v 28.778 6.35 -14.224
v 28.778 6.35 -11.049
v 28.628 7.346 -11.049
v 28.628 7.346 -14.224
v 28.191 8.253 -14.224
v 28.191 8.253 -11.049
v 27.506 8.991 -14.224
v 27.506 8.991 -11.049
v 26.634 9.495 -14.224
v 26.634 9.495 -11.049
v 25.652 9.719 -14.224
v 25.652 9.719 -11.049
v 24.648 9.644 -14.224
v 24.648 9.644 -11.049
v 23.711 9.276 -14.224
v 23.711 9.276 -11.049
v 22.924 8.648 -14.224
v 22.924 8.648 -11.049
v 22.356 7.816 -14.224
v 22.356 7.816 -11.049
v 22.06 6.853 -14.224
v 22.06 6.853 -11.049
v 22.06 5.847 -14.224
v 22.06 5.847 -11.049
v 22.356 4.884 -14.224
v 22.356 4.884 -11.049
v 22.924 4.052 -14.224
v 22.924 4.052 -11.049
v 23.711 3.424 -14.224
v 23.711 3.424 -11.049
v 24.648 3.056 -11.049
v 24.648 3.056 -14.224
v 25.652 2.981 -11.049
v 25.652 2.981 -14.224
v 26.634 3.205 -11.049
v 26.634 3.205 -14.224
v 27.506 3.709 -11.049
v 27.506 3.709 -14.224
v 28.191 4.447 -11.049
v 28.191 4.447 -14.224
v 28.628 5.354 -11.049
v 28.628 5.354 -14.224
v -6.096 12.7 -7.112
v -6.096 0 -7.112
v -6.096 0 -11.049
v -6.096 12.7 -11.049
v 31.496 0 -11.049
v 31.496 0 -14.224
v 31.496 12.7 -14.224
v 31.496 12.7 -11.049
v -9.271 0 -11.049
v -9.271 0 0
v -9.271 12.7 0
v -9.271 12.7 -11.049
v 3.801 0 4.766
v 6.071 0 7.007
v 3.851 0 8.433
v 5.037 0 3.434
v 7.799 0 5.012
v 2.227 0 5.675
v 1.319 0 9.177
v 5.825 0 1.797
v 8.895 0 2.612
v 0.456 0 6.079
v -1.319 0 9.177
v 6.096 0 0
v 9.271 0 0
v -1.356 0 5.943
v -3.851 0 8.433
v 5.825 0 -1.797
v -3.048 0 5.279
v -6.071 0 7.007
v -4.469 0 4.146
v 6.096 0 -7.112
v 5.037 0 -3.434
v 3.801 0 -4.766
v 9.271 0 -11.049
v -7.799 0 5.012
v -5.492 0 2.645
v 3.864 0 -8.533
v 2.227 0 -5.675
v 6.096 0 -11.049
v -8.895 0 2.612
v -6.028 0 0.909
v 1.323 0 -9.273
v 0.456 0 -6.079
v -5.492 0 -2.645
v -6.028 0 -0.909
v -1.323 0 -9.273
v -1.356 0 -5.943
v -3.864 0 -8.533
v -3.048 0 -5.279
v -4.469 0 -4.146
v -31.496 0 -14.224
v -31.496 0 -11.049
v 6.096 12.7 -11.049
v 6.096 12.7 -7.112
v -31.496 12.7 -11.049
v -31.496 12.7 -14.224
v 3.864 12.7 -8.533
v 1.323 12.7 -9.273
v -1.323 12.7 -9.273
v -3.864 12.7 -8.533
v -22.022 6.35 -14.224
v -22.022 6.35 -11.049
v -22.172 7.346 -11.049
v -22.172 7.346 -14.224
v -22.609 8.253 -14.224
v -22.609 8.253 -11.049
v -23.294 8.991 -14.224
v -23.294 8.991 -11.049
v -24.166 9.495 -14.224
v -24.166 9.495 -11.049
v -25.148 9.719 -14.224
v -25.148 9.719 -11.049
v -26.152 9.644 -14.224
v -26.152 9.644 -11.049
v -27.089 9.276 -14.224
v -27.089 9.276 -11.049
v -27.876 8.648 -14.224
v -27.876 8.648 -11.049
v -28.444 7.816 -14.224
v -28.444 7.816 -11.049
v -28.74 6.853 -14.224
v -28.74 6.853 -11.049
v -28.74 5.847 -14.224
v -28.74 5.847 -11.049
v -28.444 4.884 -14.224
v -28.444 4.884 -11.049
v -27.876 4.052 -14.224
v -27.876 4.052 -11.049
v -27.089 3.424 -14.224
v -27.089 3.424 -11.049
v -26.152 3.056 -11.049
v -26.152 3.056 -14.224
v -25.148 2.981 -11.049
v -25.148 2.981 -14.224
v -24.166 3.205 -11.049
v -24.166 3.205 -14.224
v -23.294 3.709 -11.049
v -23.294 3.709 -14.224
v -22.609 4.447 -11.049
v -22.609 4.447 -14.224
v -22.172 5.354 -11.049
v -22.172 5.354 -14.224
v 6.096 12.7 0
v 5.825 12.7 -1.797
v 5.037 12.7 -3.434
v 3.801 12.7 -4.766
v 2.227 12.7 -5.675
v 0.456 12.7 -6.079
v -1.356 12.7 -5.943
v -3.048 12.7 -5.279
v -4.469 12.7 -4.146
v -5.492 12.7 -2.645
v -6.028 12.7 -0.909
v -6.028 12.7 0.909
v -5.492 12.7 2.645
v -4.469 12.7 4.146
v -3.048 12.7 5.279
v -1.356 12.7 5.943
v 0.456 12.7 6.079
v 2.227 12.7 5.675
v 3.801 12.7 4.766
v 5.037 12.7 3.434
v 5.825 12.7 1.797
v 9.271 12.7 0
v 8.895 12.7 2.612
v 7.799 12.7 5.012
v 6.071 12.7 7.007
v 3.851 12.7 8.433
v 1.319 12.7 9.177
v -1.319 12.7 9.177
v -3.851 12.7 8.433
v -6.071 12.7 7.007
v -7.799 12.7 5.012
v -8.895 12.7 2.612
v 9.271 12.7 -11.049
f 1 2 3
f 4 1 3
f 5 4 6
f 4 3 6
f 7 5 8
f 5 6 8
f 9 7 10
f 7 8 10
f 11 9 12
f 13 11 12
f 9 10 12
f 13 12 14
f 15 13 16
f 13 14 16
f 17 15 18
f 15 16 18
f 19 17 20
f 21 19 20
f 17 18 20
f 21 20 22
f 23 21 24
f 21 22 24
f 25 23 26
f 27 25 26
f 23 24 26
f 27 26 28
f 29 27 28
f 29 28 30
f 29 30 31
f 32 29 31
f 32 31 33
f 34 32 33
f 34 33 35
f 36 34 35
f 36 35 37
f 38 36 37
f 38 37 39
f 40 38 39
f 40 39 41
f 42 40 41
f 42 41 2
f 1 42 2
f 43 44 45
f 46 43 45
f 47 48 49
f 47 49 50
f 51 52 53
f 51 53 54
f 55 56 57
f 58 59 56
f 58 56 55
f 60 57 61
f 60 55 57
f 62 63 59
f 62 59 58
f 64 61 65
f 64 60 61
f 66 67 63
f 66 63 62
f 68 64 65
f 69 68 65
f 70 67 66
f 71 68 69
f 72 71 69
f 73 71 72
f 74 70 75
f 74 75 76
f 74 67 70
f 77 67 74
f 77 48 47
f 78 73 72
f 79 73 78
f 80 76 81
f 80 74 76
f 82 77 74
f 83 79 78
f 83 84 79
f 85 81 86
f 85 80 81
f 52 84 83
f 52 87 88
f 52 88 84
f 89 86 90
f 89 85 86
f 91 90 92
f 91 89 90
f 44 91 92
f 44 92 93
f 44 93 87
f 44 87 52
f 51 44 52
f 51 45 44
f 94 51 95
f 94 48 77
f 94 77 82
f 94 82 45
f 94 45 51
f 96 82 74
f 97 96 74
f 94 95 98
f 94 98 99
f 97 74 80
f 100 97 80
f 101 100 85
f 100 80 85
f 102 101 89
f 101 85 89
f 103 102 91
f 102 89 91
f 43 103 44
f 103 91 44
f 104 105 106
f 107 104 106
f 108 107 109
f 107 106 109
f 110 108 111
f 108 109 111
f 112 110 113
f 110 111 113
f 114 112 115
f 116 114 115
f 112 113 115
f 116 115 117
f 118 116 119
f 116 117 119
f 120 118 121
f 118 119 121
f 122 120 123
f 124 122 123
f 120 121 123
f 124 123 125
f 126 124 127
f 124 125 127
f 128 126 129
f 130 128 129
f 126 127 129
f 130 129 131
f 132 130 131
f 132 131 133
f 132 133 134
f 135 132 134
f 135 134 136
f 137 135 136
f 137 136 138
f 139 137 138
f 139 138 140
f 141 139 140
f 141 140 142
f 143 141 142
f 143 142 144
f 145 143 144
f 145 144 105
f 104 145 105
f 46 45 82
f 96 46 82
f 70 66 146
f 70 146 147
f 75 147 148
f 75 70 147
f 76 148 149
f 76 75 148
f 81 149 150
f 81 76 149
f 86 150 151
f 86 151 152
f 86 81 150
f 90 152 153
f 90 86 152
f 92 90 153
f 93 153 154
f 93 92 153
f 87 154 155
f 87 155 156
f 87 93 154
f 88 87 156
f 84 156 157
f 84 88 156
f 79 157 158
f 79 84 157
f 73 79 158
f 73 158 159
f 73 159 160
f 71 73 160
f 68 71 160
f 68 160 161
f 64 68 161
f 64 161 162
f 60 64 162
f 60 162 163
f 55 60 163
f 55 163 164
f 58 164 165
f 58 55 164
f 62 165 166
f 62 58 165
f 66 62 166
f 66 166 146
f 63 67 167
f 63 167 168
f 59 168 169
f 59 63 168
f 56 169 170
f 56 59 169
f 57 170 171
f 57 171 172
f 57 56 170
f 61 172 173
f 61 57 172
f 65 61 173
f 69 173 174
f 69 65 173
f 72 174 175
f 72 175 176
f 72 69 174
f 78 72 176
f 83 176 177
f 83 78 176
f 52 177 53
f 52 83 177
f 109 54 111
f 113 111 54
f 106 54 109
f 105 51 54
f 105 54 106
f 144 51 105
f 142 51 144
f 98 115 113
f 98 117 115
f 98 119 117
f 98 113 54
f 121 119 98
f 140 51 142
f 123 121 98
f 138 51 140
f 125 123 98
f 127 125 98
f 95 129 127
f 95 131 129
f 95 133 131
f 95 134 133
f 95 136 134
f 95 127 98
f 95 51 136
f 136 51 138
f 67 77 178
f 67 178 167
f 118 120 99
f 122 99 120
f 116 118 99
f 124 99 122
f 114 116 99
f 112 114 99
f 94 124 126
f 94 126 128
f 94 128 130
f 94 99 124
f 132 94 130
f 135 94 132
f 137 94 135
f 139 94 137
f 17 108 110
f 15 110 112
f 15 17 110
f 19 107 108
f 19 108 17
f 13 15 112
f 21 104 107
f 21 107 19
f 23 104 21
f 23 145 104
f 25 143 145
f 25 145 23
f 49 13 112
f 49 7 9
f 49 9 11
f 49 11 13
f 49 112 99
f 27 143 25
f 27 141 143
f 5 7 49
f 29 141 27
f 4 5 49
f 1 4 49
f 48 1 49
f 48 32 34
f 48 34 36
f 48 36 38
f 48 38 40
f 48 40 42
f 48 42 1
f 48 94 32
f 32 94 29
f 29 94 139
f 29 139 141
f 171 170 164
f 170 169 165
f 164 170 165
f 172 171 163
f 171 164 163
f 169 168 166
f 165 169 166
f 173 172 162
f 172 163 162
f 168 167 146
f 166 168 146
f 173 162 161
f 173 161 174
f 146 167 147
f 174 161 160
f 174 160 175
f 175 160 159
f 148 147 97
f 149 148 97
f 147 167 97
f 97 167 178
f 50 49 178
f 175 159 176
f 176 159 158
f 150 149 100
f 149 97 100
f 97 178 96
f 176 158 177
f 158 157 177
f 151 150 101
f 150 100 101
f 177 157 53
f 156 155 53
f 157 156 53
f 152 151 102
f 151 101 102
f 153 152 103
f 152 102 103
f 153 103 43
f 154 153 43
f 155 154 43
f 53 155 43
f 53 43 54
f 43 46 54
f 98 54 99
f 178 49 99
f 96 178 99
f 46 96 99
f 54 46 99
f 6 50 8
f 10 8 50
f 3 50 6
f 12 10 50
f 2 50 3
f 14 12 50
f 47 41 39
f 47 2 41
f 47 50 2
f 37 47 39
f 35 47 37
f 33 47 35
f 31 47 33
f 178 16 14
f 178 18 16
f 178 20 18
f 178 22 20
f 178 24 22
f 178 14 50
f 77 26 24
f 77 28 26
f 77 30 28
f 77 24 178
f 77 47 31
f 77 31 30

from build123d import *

# Parameters (mm, degrees)
SKETCH1_R           = 6.096
BOSS_EXTRUDE1_DEPTH = 12.7
SKETCH2_R           = 3.3782
CUT_EXTRUDE1_DEPTH  = 4.175


with BuildPart() as part:
    # Sketch1 → Boss-Extrude1 (new body)
    with BuildSketch(Plane(origin=(0, 0, 0), x_dir=(1, 0, 0), z_dir=(0, 1, 0))):
        with BuildLine():
            Line((-9.271, 0), (-9.271, 11.049))
            Line((-9.271, 11.049), (-31.496, 11.049))
            Line((-31.496, 11.049), (-31.496, 14.224))
            Line((-31.496, 14.224), (-6.096, 14.224))
            Line((-6.096, 14.224), (6.096, 14.224))
            Line((6.096, 14.224), (31.496, 14.224))
            Line((31.496, 14.224), (31.496, 11.049))
            Line((31.496, 11.049), (9.271, 11.049))
            Line((9.271, 11.049), (9.271, 0))
            ThreePointArc((9.271, 0), (0, -9.271), (-9.271, 0))
        make_face()
        Circle(SKETCH1_R, mode=Mode.SUBTRACT)
        with BuildLine():
            Line((-6.096, 7.112), (-6.096, 11.049))
            Line((-6.096, 11.049), (6.096, 11.049))
            Line((6.096, 11.049), (6.096, 7.112))
            ThreePointArc((6.096, 7.112), (0, 9.367057169), (-6.096, 7.112))
        make_face(mode=Mode.SUBTRACT)
    extrude(amount=BOSS_EXTRUDE1_DEPTH)

    # Sketch2 → Cut-Extrude1 (cut, through all)
    with BuildSketch(Plane.XY.offset(-11.049)):
        with Locations((-25.4, 6.35)):
            Circle(SKETCH2_R)
        with Locations((25.4, 6.35)):
            Circle(SKETCH2_R)
    extrude(amount=-CUT_EXTRUDE1_DEPTH, mode=Mode.SUBTRACT)


solid = part.part
